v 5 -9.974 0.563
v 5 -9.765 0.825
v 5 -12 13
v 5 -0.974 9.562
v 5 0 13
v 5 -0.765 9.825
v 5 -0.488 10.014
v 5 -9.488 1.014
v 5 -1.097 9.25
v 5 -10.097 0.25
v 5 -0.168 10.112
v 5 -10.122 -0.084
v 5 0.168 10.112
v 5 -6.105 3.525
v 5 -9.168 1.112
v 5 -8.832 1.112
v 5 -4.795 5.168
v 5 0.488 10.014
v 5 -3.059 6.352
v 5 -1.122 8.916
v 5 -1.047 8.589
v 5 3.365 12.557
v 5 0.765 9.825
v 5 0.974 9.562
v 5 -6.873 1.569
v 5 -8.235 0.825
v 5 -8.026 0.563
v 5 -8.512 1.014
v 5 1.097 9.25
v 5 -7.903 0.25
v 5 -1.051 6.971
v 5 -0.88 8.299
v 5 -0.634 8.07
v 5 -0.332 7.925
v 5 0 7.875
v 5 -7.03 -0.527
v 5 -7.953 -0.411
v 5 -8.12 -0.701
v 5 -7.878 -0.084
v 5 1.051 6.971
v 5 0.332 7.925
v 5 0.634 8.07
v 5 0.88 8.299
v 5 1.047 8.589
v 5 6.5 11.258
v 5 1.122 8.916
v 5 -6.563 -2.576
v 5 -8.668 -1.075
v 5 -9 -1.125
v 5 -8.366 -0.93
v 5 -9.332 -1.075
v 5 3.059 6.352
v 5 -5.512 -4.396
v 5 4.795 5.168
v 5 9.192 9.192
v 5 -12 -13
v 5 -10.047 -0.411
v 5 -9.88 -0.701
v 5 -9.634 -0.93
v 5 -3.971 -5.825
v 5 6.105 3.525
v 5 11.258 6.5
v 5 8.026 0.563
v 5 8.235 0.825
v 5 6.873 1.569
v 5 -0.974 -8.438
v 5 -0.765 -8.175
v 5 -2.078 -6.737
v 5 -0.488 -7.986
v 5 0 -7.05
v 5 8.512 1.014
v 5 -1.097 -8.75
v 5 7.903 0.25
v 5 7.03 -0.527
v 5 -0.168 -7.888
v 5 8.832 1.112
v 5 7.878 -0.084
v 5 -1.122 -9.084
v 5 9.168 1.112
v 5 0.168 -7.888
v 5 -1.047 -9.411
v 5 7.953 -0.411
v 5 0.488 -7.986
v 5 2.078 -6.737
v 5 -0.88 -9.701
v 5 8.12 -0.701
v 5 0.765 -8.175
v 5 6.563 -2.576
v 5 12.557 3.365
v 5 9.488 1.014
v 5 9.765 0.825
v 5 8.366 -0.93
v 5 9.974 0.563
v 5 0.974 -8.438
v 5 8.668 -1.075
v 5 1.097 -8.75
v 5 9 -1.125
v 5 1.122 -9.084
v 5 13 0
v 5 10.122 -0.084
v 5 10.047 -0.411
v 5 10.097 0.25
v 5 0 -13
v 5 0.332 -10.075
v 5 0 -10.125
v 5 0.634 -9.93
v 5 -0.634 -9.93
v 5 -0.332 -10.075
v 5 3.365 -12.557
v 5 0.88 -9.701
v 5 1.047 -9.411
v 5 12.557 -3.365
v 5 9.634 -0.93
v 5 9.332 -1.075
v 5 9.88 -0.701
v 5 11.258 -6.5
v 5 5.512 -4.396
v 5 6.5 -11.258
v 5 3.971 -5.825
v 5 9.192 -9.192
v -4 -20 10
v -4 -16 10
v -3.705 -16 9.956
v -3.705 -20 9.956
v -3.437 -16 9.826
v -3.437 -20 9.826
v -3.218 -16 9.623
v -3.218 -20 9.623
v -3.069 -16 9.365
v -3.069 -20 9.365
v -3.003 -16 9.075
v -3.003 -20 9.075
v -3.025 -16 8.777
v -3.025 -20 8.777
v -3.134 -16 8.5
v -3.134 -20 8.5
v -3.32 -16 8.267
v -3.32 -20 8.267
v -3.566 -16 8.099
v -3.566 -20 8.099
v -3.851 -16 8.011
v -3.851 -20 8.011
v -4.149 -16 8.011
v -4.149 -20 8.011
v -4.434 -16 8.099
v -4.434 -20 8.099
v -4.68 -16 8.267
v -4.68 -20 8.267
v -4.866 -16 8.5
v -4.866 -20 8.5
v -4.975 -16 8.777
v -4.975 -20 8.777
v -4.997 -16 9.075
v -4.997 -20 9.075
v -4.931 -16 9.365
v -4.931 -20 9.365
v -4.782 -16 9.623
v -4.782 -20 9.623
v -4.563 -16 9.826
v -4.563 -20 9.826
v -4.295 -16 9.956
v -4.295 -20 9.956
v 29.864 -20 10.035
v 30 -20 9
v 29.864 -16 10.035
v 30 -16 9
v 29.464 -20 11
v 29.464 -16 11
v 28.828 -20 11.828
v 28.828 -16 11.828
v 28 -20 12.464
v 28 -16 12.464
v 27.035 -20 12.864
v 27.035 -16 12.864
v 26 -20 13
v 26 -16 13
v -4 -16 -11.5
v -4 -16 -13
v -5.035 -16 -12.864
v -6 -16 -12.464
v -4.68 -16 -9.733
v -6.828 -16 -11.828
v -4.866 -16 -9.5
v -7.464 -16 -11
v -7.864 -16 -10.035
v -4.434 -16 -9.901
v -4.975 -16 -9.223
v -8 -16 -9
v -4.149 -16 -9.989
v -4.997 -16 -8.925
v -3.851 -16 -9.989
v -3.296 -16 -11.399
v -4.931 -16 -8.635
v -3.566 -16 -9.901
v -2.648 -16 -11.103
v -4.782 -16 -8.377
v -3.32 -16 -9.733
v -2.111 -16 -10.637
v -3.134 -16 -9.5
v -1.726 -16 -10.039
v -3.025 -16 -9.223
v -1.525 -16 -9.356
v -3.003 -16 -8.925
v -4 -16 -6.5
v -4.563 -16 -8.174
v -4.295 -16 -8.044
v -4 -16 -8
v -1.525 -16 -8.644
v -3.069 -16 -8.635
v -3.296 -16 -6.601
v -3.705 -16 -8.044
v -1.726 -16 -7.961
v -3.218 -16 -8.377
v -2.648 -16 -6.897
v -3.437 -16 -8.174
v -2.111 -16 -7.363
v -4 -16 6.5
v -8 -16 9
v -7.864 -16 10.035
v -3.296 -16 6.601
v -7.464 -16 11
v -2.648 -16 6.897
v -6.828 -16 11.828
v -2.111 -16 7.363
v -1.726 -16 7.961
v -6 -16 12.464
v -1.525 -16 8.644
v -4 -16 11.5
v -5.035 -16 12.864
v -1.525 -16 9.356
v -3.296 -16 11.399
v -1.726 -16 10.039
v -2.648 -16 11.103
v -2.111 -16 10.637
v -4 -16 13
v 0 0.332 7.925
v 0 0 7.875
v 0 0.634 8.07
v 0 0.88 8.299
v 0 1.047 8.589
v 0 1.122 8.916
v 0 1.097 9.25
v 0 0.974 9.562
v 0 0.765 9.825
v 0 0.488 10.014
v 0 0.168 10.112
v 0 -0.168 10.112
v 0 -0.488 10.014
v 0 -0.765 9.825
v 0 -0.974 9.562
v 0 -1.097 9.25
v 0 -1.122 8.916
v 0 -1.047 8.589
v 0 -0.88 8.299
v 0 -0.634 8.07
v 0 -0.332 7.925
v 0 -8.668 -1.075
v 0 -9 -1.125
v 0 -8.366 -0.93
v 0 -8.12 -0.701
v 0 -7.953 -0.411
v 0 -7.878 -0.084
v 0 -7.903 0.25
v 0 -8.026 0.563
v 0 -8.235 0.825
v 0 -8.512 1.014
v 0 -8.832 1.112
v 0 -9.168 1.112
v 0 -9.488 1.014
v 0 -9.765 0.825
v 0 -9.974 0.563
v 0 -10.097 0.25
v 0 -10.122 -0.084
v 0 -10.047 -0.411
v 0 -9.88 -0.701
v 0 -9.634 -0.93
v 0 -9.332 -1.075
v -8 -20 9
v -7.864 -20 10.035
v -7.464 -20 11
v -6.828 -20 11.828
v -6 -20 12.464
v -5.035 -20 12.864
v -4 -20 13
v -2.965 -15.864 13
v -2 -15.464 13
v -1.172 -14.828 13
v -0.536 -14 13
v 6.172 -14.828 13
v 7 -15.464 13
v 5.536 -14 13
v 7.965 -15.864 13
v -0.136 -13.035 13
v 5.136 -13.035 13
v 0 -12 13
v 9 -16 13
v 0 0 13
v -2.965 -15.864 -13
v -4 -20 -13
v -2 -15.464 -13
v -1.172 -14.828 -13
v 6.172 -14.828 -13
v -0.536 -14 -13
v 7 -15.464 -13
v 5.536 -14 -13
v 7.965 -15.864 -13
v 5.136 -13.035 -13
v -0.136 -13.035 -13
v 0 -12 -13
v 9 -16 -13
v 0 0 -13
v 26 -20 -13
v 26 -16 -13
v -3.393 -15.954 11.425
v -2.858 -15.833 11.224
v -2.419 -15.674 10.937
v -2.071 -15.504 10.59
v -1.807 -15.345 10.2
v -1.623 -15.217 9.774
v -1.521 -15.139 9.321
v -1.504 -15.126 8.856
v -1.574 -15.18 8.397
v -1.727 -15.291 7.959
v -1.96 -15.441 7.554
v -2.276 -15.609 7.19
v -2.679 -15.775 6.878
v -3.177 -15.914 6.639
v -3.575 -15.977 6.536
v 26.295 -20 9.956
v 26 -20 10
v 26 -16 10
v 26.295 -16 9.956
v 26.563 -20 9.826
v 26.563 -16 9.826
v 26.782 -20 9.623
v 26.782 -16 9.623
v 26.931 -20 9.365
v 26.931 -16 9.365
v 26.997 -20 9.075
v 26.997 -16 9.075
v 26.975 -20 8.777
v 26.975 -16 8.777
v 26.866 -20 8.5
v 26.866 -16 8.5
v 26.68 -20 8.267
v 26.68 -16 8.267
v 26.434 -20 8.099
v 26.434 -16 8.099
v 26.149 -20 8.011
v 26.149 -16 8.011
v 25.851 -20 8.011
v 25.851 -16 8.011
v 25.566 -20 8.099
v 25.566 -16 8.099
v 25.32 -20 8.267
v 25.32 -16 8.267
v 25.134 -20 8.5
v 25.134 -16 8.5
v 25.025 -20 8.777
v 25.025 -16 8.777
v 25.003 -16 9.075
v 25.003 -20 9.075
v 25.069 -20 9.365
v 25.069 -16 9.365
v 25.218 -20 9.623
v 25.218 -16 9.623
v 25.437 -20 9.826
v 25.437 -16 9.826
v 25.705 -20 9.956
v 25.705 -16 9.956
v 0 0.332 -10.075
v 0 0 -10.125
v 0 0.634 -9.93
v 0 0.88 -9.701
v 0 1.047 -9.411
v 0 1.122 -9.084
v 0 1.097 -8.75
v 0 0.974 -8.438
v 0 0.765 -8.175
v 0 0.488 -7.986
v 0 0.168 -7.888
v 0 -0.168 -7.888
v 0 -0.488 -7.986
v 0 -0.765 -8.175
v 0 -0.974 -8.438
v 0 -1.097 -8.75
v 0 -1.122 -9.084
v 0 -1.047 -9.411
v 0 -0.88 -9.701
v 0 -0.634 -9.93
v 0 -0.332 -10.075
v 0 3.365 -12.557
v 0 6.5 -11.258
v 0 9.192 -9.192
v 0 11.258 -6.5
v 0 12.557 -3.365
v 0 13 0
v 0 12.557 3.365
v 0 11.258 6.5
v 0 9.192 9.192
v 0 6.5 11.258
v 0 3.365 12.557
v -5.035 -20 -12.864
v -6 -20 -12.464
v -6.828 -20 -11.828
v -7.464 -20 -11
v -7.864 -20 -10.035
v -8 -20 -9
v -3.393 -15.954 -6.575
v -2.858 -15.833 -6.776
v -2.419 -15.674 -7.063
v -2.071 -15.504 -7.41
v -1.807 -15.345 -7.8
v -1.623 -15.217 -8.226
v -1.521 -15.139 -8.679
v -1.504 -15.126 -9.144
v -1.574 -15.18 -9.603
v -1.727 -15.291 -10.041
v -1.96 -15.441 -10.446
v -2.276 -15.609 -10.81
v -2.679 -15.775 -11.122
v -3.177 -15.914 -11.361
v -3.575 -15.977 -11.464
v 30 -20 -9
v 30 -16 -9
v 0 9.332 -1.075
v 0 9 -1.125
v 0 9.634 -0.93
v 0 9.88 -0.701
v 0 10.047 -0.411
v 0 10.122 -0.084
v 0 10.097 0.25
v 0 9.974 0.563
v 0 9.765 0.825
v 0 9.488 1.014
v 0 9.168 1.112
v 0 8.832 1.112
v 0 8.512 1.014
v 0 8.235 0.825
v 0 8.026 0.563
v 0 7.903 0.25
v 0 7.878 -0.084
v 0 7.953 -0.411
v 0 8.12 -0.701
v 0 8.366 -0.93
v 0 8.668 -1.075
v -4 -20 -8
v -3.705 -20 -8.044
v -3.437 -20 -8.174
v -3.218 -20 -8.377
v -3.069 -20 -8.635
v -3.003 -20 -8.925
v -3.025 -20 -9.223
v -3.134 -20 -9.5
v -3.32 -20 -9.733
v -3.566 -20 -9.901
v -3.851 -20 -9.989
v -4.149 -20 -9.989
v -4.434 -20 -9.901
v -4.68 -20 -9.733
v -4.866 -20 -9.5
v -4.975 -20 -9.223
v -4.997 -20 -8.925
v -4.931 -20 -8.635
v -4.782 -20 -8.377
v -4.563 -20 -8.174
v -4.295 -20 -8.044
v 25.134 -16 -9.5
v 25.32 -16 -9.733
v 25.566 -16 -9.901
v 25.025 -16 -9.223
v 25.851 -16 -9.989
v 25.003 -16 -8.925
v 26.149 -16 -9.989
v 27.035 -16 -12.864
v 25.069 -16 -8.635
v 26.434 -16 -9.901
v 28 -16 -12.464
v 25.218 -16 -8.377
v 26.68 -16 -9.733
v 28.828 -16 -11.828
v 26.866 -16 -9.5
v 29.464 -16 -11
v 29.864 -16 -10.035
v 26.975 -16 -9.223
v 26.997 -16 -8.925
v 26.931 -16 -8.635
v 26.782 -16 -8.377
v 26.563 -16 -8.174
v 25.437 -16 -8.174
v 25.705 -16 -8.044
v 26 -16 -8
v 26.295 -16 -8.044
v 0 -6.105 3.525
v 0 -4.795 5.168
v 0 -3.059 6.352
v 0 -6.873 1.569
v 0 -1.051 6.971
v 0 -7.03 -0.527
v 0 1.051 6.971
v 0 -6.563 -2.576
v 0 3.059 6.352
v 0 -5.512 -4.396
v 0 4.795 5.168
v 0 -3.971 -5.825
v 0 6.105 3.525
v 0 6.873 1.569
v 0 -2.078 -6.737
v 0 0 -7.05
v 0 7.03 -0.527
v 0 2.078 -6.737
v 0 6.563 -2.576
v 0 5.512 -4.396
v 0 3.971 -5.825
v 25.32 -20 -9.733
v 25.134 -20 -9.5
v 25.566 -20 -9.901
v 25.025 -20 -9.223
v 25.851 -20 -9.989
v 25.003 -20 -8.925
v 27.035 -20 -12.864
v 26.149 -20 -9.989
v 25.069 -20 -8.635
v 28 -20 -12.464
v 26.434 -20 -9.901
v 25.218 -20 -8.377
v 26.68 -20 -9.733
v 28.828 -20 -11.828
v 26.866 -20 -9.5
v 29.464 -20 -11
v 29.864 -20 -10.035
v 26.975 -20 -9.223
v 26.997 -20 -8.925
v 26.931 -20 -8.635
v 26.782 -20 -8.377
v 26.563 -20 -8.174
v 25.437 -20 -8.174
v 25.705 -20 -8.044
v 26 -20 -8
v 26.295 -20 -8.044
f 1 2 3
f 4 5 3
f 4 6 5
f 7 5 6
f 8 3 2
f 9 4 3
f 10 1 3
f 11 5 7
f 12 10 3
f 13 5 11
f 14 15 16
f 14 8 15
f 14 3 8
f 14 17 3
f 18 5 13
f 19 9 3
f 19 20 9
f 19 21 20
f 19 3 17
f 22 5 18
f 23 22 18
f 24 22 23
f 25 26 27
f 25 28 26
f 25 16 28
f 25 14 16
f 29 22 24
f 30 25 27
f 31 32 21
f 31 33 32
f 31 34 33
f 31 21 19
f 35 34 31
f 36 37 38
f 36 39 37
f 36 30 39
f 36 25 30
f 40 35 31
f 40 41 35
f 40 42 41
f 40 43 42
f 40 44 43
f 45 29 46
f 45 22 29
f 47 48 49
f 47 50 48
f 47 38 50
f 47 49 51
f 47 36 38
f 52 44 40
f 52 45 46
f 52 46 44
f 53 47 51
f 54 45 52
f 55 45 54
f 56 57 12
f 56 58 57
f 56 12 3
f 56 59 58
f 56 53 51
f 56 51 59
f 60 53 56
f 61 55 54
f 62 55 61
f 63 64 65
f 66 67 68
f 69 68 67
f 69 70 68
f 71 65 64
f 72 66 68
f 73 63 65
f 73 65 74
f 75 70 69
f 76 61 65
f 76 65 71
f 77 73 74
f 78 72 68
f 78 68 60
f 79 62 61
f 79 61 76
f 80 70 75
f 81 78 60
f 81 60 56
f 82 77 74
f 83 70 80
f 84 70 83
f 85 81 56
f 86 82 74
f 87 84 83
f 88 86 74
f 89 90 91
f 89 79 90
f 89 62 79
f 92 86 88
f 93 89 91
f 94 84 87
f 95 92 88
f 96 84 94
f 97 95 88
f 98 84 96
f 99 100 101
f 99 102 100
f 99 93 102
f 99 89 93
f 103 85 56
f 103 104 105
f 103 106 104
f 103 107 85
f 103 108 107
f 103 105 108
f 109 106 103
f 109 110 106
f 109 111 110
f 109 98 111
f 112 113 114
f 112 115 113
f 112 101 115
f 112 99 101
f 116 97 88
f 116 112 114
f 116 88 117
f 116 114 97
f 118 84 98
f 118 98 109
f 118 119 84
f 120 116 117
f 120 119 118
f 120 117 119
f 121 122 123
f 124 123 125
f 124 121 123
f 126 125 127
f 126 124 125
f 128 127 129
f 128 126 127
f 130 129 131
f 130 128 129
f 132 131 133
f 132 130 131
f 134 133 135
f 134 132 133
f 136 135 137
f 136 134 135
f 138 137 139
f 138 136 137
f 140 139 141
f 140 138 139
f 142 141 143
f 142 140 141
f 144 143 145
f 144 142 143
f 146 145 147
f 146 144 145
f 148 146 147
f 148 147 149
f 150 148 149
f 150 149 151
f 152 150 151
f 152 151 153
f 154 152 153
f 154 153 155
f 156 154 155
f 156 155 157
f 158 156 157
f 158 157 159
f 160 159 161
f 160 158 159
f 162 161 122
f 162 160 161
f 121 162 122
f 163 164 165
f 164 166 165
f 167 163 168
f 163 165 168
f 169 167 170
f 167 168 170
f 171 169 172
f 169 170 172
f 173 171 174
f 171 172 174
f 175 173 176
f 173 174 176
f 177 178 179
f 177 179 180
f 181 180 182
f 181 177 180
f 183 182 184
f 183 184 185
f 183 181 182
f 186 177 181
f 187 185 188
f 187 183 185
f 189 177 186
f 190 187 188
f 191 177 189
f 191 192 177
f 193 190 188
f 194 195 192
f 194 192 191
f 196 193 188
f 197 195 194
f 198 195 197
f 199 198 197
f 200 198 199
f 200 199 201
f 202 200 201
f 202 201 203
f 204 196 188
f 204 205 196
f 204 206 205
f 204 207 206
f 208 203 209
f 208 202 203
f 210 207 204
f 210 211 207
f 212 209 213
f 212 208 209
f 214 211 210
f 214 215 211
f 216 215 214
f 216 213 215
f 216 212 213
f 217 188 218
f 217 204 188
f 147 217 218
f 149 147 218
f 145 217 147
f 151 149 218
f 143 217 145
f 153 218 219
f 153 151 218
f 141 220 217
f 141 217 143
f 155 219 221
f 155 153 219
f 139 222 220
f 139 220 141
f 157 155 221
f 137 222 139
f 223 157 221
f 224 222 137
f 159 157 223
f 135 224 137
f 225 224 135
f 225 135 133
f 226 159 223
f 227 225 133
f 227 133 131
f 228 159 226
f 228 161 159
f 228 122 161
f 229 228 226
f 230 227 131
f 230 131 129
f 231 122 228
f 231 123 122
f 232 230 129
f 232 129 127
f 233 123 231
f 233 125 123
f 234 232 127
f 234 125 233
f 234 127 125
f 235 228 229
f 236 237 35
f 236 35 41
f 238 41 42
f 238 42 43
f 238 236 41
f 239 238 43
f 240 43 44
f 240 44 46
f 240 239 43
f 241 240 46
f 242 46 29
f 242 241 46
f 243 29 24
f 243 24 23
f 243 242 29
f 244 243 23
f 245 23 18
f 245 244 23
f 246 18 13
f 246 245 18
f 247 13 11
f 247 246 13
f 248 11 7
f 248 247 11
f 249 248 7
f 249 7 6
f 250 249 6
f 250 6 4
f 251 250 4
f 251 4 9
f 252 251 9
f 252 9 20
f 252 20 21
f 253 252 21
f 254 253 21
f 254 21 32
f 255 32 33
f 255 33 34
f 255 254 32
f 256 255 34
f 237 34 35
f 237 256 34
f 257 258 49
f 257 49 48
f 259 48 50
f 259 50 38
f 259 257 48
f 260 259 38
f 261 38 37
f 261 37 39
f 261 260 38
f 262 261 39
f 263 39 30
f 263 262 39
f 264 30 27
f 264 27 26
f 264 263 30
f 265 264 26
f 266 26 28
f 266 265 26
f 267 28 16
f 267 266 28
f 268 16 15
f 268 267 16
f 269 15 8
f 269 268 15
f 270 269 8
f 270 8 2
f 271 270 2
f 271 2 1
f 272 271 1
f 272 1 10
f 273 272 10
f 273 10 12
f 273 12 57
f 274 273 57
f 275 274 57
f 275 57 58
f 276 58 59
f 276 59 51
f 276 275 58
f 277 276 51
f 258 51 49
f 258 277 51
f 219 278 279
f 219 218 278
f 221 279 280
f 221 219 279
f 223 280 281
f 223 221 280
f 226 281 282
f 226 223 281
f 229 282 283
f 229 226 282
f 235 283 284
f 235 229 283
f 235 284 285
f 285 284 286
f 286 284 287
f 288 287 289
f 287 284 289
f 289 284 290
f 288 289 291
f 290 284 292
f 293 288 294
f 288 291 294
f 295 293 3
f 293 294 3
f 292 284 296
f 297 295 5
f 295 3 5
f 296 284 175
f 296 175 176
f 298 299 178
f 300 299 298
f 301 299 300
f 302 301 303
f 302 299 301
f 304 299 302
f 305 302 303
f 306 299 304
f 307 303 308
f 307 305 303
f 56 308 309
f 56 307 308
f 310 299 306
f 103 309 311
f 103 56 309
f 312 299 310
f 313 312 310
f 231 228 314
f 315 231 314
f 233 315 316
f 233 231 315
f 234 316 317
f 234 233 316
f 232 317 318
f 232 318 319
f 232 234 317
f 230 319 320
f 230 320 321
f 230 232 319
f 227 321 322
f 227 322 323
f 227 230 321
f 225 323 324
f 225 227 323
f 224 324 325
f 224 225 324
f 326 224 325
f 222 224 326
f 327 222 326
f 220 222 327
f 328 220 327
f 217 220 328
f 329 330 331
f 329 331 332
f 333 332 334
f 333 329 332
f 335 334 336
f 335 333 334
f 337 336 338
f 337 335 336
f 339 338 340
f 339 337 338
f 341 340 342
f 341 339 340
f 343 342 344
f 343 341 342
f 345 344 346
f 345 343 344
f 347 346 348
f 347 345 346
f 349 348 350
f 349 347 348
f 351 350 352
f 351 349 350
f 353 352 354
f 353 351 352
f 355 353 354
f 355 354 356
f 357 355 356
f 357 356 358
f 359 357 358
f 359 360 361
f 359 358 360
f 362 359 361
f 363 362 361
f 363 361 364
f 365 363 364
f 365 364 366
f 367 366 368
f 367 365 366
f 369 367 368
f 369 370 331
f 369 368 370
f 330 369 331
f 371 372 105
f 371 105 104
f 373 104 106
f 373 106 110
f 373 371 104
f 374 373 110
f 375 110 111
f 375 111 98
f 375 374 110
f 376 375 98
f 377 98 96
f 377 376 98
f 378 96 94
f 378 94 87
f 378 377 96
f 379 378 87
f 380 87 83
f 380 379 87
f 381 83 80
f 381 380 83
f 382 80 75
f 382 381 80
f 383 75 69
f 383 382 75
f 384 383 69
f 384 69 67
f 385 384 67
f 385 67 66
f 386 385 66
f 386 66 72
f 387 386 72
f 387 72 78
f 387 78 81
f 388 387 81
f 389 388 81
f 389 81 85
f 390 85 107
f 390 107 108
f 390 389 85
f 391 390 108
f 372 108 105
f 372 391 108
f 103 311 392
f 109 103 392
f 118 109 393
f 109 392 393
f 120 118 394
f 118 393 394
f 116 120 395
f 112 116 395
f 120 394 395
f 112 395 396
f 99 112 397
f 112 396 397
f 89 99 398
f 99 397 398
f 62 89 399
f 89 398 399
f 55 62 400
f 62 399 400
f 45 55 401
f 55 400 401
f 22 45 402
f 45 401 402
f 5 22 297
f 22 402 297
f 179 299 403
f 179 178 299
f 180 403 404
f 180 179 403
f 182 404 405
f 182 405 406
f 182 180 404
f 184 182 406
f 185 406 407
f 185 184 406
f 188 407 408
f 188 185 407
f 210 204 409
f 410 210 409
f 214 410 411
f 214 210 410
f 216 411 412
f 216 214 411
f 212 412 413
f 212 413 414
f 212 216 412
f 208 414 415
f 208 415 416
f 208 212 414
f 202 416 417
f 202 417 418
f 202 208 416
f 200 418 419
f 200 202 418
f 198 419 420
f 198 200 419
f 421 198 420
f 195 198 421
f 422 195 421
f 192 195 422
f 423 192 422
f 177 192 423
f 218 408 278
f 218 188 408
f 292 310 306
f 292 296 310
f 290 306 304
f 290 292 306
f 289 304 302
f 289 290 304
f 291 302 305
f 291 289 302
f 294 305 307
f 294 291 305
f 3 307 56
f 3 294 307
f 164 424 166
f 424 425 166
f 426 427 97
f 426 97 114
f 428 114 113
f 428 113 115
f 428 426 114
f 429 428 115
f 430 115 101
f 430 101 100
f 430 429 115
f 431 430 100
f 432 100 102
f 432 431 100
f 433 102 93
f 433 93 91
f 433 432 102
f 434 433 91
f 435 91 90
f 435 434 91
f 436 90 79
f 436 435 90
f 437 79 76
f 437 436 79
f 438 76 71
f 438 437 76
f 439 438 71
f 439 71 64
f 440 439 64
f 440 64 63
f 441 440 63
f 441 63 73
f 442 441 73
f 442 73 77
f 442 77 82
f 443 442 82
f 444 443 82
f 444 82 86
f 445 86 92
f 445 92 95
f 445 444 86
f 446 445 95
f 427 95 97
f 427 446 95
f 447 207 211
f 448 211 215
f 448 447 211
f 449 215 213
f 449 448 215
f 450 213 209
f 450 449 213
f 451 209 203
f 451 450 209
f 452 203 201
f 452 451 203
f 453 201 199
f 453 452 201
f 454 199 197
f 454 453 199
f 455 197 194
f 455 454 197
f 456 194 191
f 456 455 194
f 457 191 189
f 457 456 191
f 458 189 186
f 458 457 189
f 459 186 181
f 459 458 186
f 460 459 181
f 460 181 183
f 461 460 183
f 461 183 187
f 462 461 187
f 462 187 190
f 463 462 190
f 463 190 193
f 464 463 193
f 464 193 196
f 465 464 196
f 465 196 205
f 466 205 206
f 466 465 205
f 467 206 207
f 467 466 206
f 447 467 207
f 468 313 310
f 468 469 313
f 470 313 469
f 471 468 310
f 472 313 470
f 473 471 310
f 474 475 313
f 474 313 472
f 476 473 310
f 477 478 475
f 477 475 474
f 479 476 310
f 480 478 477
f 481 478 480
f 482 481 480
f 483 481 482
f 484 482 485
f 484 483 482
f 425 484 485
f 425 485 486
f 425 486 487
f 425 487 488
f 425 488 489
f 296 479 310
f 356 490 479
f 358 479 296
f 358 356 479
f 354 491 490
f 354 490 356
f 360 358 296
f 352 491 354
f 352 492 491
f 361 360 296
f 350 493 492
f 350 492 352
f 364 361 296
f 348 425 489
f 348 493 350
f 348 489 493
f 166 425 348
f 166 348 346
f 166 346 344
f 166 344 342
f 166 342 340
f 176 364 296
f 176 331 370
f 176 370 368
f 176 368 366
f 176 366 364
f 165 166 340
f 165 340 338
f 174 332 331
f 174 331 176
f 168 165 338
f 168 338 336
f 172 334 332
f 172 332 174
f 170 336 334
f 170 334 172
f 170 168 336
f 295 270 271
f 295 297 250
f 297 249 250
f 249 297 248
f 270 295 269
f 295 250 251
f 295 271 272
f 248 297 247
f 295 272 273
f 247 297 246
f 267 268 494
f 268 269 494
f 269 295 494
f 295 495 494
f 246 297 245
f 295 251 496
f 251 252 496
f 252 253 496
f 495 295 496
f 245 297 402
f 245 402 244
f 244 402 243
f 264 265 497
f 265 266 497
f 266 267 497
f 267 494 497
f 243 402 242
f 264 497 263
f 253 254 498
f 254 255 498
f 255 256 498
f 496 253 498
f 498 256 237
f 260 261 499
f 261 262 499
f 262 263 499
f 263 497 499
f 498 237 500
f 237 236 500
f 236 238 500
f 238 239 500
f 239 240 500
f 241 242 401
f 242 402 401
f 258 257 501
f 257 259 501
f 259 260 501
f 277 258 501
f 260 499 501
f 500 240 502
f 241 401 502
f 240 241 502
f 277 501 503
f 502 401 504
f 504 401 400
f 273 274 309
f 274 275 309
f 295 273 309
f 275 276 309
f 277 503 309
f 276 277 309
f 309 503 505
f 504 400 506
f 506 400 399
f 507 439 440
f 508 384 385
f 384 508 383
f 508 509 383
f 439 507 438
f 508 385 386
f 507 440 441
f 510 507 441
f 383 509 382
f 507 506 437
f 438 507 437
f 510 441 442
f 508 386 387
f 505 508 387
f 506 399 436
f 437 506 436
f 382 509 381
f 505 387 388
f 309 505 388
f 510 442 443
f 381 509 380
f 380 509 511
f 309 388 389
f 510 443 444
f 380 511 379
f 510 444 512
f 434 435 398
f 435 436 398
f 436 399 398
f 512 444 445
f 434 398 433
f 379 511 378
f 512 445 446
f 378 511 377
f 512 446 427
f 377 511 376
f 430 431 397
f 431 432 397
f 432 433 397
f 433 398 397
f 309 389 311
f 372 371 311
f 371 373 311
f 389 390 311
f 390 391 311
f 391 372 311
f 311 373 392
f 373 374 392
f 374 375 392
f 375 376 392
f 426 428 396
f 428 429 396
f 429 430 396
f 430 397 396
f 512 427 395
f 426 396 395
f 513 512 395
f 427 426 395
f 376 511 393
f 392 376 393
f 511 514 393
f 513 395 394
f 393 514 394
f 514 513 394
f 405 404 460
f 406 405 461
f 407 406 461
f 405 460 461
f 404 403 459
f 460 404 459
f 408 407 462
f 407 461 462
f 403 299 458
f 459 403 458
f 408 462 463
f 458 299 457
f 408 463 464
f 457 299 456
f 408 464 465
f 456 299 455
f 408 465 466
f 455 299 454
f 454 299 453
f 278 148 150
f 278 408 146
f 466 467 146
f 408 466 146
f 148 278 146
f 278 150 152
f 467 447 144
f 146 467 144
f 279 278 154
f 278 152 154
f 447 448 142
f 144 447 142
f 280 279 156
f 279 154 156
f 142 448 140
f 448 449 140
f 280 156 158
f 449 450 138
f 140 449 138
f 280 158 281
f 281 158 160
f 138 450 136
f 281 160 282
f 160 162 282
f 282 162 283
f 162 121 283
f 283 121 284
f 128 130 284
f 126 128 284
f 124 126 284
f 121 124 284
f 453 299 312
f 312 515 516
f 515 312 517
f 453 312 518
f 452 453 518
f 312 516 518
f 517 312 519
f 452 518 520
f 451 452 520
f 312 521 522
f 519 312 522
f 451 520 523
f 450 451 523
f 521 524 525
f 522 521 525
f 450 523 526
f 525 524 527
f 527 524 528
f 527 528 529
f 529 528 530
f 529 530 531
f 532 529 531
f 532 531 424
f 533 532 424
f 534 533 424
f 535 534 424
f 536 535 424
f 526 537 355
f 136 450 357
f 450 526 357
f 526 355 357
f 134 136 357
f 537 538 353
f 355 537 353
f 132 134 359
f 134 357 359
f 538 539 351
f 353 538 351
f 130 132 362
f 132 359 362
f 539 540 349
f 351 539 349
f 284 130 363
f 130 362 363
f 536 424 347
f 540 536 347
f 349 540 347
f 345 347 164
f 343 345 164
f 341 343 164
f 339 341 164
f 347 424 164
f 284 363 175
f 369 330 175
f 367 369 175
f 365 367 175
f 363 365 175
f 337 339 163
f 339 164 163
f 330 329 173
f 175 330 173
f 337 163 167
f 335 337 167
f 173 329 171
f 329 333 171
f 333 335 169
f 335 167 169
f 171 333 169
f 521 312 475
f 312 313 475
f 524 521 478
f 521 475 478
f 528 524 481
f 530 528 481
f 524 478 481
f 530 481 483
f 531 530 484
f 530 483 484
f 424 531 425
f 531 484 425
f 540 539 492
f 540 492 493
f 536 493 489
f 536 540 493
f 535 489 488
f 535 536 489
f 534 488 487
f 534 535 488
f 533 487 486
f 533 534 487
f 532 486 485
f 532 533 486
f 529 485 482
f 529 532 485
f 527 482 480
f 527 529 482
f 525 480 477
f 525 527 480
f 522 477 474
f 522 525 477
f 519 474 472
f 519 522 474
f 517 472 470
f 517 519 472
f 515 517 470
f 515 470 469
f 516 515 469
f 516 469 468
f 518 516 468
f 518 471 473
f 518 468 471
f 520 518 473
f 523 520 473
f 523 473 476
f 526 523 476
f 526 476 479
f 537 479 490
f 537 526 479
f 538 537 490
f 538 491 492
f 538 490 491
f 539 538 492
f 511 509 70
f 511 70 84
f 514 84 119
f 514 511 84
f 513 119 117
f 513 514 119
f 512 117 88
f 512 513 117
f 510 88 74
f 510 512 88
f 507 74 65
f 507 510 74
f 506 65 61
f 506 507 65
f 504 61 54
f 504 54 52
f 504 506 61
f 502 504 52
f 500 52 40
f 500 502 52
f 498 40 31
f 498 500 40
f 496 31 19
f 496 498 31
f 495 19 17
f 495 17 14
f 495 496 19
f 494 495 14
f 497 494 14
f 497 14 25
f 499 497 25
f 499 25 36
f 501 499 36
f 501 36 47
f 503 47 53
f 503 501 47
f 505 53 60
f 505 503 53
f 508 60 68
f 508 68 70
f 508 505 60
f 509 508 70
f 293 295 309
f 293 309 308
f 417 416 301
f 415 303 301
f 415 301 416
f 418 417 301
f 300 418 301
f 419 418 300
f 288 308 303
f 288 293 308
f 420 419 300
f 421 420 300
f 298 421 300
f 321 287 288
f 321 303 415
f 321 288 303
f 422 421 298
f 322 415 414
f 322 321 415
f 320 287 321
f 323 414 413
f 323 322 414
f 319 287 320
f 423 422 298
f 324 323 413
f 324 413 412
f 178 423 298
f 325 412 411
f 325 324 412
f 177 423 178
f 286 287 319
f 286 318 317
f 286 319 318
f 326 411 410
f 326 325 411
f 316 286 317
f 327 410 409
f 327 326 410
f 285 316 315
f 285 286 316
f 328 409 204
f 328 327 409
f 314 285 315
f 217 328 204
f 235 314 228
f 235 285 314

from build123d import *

# Parameters (mm, degrees)
SKETCH1_R                = 1.125
SKETCH1_R_2              = 7.05
BOSS_EXTRUDE1_DEPTH      = 5
BOSS_EXTRUDE2_DEPTH      = 8
BOSS_EXTRUDE2_DEPTH_BACK = 30
SKETCH2_W                = 26
SKETCH2_H                = 4
FILLET1_R                = 4
FILLET2_R                = 4
CUT_EXTRUDE1_DEPTH       = 44.703546767
CUT_EXTRUDE1_DEPTH_BACK  = 44.703546767
SKETCH3_R                = 1
CUT_EXTRUDE3_OUTLINE_R   = 1
CUT_EXTRUDE3_DEPTH       = 4.0000001


with BuildPart() as part:
    # Sketch1 → Boss-Extrude1 (new body)
    with BuildSketch(Plane(origin=(0, 0, 0), x_dir=(0, 0, -1), z_dir=(1, 0, 0))):
        with BuildLine():
            Line((-13, 0), (-13, -20))
            Line((-13, -20), (13, -20))
            Line((13, -20), (13, 0))
            ThreePointArc((13, 0), (0, 13), (-13, 0))
        make_face()
        with Locations((0, 9)):
            Circle(SKETCH1_R, mode=Mode.SUBTRACT)
        with Locations((9, 0)):
            Circle(SKETCH1_R, mode=Mode.SUBTRACT)
        with Locations((0, -9)):
            Circle(SKETCH1_R, mode=Mode.SUBTRACT)
        with Locations((-9, 0)):
            Circle(SKETCH1_R, mode=Mode.SUBTRACT)
        Circle(SKETCH1_R_2, mode=Mode.SUBTRACT)
    extrude(amount=BOSS_EXTRUDE1_DEPTH)

    # Sketch2 → Boss-Extrude2 (add, two sides: drawn at the far end of the back side and taken through both)
    with BuildSketch(Plane.ZY.offset(-BOSS_EXTRUDE2_DEPTH_BACK)):
        with Locations((0, -18)):
            Rectangle(SKETCH2_W, SKETCH2_H)
    extrude(amount=BOSS_EXTRUDE2_DEPTH + BOSS_EXTRUDE2_DEPTH_BACK)

    # Fillet1
    fillet1_edges = [part.edges().sort_by_distance(p)[0] for p in [
        (5, -16, 0),
        (0, -16, 0),
    ]]
    fillet(fillet1_edges, radius=FILLET1_R)

    # Fillet2
    fillet2_edges = [part.edges().sort_by_distance(p)[0] for p in [
        (30, -18, -13),
        (30, -18, 13),
        (-8, -18, -13),
        (-8, -18, 13),
    ]]
    fillet(fillet2_edges, radius=FILLET2_R)

    # Sketch3 → Cut-Extrude1 (cut, two sides: drawn at the far end of the back side and taken through both)
    with BuildSketch(Plane(origin=(0, -16, 0), x_dir=(1, 0, 0), z_dir=(0, 1, 0)).offset(-CUT_EXTRUDE1_DEPTH_BACK)):
        with Locations(Location((-4, -9, 0), (0, 0, 270.000000003))):
            Circle(SKETCH3_R)
        with Locations(Location((-4, 9, 0), (0, 0, 270.000000003))):
            Circle(SKETCH3_R)
        with Locations(Location((26, 9, 0), (0, 0, 270))):
            Circle(SKETCH3_R)
        with Locations(Location((26, -9, 0), (0, 0, 270))):
            Circle(SKETCH3_R)
    extrude(amount=CUT_EXTRUDE1_DEPTH + CUT_EXTRUDE1_DEPTH_BACK, mode=Mode.SUBTRACT)

    # Cut-Extrude3: read off the stored shape, not the designer's step
    # Cut-Extrude3 outline → Cut-Extrude3 (cut)
    with BuildSketch(Plane(origin=(0, -16, 0), x_dir=(1, 0, 0), z_dir=(0, 1, 0))):
        with BuildLine():
            Line((-4, -6.5), (-4, 6.5))
            ThreePointArc((-4, 6.5), (-1.5, 9), (-4, 11.5))
            Line((-4, 11.5), (-4, 13))
            ThreePointArc((-4, 13), (-6.828427125, 11.828427125), (-8, 9))
            Line((-8, 9), (-8, -9))
            ThreePointArc((-8, -9), (-6.828427125, -11.828427125), (-4, -13))
            Line((-4, -13), (-4, -11.5))
            ThreePointArc((-4, -11.5), (-1.5, -9), (-4, -6.5))
        make_face()
        with Locations((-4, -9)):
            Circle(CUT_EXTRUDE3_OUTLINE_R, mode=Mode.SUBTRACT)
        with Locations((-4, 9)):
            Circle(CUT_EXTRUDE3_OUTLINE_R, mode=Mode.SUBTRACT)
    extrude(amount=CUT_EXTRUDE3_DEPTH, mode=Mode.SUBTRACT)


solid = part.part
